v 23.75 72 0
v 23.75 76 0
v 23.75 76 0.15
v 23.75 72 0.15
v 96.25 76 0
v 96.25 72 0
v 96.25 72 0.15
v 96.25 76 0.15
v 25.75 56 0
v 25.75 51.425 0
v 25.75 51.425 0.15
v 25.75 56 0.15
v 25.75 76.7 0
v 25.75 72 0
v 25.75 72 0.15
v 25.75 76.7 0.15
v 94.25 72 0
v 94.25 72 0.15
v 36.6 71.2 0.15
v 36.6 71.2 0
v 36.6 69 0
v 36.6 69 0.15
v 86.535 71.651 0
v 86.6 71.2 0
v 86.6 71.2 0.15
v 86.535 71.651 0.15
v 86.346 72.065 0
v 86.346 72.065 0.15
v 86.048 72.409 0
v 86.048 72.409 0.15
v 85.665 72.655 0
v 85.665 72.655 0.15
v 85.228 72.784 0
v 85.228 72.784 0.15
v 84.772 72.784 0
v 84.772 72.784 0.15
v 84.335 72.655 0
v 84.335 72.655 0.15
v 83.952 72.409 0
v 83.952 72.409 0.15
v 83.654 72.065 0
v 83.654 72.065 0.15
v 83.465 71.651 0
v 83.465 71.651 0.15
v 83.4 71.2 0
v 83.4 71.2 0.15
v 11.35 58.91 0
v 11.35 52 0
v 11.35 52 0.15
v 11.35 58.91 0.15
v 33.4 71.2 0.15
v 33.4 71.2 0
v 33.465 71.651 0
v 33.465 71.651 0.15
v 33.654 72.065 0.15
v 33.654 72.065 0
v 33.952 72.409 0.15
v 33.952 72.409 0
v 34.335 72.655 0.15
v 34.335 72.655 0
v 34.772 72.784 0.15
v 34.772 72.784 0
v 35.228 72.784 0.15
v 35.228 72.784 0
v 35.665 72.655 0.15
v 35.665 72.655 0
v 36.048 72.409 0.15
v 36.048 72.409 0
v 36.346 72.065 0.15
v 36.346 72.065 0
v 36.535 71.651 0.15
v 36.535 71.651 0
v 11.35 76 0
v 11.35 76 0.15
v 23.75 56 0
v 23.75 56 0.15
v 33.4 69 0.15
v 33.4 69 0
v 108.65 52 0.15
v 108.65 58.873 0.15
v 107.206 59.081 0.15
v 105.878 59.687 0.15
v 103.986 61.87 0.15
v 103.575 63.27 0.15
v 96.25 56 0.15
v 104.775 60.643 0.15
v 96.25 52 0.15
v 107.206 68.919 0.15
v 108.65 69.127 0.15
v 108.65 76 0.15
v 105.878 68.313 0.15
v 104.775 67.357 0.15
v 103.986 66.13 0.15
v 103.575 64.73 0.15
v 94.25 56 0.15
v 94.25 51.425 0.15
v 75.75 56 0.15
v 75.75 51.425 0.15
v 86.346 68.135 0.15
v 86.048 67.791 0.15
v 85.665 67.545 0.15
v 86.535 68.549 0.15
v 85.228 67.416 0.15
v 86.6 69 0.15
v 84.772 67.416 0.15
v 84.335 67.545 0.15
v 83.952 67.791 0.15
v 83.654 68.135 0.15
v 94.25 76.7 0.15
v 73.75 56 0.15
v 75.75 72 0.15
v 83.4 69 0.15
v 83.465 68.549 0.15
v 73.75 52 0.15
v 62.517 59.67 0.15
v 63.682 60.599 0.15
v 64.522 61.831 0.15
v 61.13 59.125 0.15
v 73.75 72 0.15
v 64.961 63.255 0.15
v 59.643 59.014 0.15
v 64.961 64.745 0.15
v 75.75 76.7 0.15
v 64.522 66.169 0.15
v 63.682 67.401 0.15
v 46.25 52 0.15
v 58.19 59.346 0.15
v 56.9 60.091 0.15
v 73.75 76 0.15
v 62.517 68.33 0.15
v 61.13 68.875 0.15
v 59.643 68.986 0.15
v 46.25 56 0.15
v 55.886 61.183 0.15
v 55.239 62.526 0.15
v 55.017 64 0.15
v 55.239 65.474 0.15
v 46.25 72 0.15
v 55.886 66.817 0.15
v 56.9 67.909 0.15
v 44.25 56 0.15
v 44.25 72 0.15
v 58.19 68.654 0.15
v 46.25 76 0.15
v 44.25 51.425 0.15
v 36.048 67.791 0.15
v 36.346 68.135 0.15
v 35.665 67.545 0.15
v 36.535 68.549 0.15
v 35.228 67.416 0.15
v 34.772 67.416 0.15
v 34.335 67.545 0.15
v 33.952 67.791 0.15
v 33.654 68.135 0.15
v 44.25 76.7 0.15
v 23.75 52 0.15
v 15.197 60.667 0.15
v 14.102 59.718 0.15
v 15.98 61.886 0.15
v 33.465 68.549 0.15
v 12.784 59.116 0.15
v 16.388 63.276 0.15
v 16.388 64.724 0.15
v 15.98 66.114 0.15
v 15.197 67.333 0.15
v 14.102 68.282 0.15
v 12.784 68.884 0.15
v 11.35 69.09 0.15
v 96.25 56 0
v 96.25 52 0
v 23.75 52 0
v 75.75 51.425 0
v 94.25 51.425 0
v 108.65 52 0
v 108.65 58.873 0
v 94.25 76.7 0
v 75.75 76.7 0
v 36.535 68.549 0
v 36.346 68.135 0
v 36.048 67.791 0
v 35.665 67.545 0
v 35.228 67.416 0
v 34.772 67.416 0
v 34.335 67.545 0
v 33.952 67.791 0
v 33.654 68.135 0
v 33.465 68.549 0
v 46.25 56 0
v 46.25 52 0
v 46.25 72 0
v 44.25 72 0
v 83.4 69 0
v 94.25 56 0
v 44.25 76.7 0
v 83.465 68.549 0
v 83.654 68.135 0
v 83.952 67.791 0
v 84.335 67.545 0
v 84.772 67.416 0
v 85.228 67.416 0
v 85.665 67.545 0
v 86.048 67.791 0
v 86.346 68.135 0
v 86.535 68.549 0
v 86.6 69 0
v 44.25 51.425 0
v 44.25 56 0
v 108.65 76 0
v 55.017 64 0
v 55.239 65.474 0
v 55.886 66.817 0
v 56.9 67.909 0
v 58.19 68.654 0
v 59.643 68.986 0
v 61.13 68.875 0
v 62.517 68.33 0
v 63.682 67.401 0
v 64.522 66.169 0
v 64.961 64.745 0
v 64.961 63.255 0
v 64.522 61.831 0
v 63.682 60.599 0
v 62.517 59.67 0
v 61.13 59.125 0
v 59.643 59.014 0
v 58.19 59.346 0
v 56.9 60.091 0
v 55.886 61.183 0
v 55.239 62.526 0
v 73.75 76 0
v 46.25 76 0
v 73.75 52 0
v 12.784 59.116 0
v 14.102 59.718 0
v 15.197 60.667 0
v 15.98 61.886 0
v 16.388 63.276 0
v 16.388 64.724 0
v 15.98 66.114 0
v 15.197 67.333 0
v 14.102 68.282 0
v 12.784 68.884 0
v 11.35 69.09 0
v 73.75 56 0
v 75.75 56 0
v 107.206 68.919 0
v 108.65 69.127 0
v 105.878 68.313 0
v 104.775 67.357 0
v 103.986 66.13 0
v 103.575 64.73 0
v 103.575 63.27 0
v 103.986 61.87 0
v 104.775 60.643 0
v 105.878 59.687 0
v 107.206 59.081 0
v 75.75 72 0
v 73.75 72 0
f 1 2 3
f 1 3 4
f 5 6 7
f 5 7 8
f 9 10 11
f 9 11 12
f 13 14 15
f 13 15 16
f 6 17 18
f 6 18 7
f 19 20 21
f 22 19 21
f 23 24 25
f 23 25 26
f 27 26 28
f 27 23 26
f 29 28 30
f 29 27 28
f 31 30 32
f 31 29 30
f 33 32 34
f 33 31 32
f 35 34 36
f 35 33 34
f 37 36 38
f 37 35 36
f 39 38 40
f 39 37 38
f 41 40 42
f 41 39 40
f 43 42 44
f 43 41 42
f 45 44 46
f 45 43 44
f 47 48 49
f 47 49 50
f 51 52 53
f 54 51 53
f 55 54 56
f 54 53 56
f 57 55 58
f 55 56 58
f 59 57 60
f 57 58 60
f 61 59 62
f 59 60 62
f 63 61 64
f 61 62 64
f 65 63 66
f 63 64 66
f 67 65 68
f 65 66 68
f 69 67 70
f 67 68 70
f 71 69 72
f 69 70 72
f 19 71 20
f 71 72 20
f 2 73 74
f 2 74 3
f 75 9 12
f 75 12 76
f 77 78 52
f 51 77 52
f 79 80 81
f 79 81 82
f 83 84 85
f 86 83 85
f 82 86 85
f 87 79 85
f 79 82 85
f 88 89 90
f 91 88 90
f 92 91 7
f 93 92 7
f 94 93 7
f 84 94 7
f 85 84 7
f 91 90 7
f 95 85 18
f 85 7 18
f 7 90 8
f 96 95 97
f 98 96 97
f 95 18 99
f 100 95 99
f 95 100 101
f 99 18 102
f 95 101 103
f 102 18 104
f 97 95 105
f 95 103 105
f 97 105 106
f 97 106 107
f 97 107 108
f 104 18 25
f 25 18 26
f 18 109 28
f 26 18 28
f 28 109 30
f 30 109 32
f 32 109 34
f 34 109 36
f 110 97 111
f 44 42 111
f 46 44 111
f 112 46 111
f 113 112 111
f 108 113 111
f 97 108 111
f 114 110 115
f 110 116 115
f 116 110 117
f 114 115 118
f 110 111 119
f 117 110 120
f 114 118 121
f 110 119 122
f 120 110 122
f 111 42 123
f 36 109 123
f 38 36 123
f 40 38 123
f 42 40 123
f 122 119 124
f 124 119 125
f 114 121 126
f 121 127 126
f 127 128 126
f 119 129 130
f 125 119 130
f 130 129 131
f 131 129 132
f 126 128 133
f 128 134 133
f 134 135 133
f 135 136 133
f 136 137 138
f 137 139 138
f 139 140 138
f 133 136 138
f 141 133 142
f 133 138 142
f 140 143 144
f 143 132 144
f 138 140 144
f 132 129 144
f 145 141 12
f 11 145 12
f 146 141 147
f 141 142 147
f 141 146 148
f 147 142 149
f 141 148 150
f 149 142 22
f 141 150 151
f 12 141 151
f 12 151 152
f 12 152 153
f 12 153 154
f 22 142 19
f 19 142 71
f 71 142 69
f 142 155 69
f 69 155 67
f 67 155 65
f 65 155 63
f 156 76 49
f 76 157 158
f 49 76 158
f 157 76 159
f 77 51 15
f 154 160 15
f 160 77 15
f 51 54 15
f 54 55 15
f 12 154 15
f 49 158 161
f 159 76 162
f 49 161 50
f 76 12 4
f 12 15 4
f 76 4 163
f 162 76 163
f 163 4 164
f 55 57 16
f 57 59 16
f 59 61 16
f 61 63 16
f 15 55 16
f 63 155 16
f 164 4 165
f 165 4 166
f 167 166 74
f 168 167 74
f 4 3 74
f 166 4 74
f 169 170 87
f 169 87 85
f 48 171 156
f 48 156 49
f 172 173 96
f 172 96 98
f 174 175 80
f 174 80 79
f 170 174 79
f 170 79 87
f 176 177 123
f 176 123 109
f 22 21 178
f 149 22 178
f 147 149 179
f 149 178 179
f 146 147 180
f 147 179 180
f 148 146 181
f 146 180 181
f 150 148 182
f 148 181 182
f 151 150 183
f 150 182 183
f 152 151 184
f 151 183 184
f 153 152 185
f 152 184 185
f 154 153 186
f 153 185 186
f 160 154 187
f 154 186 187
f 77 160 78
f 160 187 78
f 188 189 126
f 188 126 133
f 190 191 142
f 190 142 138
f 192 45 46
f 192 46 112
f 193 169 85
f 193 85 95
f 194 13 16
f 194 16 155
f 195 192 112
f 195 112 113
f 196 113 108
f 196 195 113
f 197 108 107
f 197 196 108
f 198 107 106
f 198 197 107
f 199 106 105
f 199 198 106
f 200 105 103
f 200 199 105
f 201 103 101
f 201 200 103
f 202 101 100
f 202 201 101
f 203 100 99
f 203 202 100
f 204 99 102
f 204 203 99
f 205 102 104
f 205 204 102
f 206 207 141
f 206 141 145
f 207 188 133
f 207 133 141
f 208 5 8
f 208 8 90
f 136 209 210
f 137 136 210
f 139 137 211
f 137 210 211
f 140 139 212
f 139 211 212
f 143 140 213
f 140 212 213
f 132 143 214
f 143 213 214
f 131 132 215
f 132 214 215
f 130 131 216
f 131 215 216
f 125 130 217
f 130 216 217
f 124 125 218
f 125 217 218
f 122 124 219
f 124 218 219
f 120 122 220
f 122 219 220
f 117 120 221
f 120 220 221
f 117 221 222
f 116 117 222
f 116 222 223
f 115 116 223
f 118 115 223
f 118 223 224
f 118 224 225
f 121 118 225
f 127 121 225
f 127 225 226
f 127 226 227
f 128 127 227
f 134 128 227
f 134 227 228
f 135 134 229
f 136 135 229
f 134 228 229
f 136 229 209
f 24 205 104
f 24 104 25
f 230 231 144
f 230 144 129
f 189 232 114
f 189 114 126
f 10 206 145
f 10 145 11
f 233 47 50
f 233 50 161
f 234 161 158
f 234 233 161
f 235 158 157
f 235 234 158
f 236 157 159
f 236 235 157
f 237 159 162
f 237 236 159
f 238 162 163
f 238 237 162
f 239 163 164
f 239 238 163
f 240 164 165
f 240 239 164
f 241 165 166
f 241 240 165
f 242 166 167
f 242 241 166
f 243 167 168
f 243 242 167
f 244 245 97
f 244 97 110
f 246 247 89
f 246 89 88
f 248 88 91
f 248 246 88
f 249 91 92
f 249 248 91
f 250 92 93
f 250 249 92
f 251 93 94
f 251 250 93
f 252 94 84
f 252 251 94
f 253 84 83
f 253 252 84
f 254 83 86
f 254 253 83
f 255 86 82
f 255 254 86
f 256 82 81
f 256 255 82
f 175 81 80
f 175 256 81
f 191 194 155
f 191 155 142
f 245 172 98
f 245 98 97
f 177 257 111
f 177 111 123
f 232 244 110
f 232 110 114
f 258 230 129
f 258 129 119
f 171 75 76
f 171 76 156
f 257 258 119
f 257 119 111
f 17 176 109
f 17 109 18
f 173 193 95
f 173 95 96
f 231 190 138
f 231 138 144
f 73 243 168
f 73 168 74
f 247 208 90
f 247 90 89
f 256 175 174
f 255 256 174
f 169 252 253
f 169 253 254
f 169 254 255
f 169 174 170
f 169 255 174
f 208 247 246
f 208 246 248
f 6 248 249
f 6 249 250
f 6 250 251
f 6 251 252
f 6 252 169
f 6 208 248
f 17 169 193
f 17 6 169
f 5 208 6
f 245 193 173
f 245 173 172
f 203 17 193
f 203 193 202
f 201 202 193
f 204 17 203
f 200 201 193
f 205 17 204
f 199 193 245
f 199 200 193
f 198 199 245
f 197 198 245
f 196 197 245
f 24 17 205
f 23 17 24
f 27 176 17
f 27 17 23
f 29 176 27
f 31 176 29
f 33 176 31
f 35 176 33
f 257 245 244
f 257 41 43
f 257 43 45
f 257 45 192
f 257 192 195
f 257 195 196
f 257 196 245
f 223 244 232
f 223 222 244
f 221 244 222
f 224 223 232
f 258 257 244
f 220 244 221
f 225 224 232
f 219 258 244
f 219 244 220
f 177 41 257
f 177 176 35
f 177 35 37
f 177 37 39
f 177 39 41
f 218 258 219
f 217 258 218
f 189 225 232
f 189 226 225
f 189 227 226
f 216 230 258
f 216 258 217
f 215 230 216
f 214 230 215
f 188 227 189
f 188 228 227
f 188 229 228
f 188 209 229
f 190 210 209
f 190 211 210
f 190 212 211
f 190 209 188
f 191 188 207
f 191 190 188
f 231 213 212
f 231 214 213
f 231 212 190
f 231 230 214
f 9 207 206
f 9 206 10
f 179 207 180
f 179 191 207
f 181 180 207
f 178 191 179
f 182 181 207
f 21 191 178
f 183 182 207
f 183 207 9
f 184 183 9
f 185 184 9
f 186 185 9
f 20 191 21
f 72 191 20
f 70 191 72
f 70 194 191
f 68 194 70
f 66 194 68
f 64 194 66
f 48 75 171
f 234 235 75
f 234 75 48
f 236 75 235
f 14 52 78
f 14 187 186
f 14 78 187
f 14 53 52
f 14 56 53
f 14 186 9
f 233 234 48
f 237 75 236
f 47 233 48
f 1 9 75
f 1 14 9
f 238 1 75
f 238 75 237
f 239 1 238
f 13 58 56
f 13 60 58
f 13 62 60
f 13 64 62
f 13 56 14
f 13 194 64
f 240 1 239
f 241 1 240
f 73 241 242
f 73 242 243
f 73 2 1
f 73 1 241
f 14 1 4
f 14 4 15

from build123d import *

# Parameters (mm, degrees)
SKETCH_1_R      = 5
EXTRUDE_1_DEPTH = 0.15


with BuildPart() as part:
    # Эскиз1 → Бобышка-Вытянуть1 (new body)
    with BuildSketch(Plane(origin=(0, 0, 0), x_dir=(-1, 0, 0), z_dir=(0, 0, -1))):
        with BuildLine():
            Line((-94.25, 76.699996948), (-94.25, 72))
            Line((-94.25, 72), (-96.25, 72))
            Line((-96.25, 72), (-96.25, 76))
            Line((-96.25, 76), (-108.650001526, 76))
            Line((-108.650001526, 76), (-108.650001526, 69.126998901))
            ThreePointArc((-108.650001526, 69.126998901), (-103.523002625, 64), (-108.650001526, 58.873001099))
            Line((-108.650001526, 58.873001099), (-108.650001526, 52))
            Line((-108.650001526, 52), (-96.25, 52))
            Line((-96.25, 52), (-96.25, 56))
            Line((-96.25, 56), (-94.25, 56))
            Line((-94.25, 56), (-94.25, 51.424999237))
            Line((-94.25, 51.424999237), (-75.75, 51.424999237))
            Line((-75.75, 51.424999237), (-75.75, 56))
            Line((-75.75, 56), (-73.75, 56))
            Line((-73.75, 56), (-73.75, 52))
            Line((-73.75, 52), (-46.25, 52))
            Line((-46.25, 52), (-46.25, 56))
            Line((-46.25, 56), (-44.25, 56))
            Line((-44.25, 56), (-44.25, 51.424999237))
            Line((-44.25, 51.424999237), (-25.75, 51.424999237))
            Line((-25.75, 51.424999237), (-25.75, 56))
            Line((-25.75, 56), (-23.75, 56))
            Line((-23.75, 56), (-23.75, 52))
            Line((-23.75, 52), (-11.350000381, 52))
            Line((-11.350000381, 52), (-11.350000381, 58.909999847))
            ThreePointArc((-11.350000381, 58.909999847), (-16.439998627, 63.999998093), (-11.350000381, 69.089996338))
            Line((-11.350000381, 69.089996338), (-11.350000381, 76))
            Line((-11.350000381, 76), (-23.75, 76))
            Line((-23.75, 76), (-23.75, 72))
            Line((-23.75, 72), (-25.75, 72))
            Line((-25.75, 72), (-25.75, 76.699996948))
            Line((-25.75, 76.699996948), (-44.25, 76.699996948))
            Line((-44.25, 76.699996948), (-44.25, 72))
            Line((-44.25, 72), (-46.25, 72))
            Line((-46.25, 72), (-46.25, 76))
            Line((-46.25, 76), (-73.75, 76))
            Line((-73.75, 76), (-73.75, 72))
            Line((-73.75, 72), (-75.75, 72))
            Line((-75.75, 72), (-75.75, 76.699996948))
            Line((-75.75, 76.699996948), (-94.25, 76.699996948))
        make_face()
        with Locations((-60.017142334, 64)):
            Circle(SKETCH_1_R, mode=Mode.SUBTRACT)
        with BuildLine():
            Line((-33.400001526, 68.999998474), (-33.400001526, 71.199998474))
            ThreePointArc((-33.400001526, 71.199998474), (-35, 72.799996948), (-36.599998474, 71.199998474))
            Line((-36.599998474, 71.199998474), (-36.599998474, 68.999998474))
            ThreePointArc((-36.599998474, 68.999998474), (-35, 67.4), (-33.400001526, 68.999998474))
        make_face(mode=Mode.SUBTRACT)
        with BuildLine():
            Line((-83.400001526, 71.199998474), (-83.400001526, 68.999998474))
            ThreePointArc((-83.400001526, 68.999998474), (-85, 67.4), (-86.599998474, 68.999998474))
            Line((-86.599998474, 68.999998474), (-86.599998474, 71.199998474))
            ThreePointArc((-86.599998474, 71.199998474), (-85, 72.799996948), (-83.400001526, 71.199998474))
        make_face(mode=Mode.SUBTRACT)
    extrude(amount=-EXTRUDE_1_DEPTH)


solid = part.part
